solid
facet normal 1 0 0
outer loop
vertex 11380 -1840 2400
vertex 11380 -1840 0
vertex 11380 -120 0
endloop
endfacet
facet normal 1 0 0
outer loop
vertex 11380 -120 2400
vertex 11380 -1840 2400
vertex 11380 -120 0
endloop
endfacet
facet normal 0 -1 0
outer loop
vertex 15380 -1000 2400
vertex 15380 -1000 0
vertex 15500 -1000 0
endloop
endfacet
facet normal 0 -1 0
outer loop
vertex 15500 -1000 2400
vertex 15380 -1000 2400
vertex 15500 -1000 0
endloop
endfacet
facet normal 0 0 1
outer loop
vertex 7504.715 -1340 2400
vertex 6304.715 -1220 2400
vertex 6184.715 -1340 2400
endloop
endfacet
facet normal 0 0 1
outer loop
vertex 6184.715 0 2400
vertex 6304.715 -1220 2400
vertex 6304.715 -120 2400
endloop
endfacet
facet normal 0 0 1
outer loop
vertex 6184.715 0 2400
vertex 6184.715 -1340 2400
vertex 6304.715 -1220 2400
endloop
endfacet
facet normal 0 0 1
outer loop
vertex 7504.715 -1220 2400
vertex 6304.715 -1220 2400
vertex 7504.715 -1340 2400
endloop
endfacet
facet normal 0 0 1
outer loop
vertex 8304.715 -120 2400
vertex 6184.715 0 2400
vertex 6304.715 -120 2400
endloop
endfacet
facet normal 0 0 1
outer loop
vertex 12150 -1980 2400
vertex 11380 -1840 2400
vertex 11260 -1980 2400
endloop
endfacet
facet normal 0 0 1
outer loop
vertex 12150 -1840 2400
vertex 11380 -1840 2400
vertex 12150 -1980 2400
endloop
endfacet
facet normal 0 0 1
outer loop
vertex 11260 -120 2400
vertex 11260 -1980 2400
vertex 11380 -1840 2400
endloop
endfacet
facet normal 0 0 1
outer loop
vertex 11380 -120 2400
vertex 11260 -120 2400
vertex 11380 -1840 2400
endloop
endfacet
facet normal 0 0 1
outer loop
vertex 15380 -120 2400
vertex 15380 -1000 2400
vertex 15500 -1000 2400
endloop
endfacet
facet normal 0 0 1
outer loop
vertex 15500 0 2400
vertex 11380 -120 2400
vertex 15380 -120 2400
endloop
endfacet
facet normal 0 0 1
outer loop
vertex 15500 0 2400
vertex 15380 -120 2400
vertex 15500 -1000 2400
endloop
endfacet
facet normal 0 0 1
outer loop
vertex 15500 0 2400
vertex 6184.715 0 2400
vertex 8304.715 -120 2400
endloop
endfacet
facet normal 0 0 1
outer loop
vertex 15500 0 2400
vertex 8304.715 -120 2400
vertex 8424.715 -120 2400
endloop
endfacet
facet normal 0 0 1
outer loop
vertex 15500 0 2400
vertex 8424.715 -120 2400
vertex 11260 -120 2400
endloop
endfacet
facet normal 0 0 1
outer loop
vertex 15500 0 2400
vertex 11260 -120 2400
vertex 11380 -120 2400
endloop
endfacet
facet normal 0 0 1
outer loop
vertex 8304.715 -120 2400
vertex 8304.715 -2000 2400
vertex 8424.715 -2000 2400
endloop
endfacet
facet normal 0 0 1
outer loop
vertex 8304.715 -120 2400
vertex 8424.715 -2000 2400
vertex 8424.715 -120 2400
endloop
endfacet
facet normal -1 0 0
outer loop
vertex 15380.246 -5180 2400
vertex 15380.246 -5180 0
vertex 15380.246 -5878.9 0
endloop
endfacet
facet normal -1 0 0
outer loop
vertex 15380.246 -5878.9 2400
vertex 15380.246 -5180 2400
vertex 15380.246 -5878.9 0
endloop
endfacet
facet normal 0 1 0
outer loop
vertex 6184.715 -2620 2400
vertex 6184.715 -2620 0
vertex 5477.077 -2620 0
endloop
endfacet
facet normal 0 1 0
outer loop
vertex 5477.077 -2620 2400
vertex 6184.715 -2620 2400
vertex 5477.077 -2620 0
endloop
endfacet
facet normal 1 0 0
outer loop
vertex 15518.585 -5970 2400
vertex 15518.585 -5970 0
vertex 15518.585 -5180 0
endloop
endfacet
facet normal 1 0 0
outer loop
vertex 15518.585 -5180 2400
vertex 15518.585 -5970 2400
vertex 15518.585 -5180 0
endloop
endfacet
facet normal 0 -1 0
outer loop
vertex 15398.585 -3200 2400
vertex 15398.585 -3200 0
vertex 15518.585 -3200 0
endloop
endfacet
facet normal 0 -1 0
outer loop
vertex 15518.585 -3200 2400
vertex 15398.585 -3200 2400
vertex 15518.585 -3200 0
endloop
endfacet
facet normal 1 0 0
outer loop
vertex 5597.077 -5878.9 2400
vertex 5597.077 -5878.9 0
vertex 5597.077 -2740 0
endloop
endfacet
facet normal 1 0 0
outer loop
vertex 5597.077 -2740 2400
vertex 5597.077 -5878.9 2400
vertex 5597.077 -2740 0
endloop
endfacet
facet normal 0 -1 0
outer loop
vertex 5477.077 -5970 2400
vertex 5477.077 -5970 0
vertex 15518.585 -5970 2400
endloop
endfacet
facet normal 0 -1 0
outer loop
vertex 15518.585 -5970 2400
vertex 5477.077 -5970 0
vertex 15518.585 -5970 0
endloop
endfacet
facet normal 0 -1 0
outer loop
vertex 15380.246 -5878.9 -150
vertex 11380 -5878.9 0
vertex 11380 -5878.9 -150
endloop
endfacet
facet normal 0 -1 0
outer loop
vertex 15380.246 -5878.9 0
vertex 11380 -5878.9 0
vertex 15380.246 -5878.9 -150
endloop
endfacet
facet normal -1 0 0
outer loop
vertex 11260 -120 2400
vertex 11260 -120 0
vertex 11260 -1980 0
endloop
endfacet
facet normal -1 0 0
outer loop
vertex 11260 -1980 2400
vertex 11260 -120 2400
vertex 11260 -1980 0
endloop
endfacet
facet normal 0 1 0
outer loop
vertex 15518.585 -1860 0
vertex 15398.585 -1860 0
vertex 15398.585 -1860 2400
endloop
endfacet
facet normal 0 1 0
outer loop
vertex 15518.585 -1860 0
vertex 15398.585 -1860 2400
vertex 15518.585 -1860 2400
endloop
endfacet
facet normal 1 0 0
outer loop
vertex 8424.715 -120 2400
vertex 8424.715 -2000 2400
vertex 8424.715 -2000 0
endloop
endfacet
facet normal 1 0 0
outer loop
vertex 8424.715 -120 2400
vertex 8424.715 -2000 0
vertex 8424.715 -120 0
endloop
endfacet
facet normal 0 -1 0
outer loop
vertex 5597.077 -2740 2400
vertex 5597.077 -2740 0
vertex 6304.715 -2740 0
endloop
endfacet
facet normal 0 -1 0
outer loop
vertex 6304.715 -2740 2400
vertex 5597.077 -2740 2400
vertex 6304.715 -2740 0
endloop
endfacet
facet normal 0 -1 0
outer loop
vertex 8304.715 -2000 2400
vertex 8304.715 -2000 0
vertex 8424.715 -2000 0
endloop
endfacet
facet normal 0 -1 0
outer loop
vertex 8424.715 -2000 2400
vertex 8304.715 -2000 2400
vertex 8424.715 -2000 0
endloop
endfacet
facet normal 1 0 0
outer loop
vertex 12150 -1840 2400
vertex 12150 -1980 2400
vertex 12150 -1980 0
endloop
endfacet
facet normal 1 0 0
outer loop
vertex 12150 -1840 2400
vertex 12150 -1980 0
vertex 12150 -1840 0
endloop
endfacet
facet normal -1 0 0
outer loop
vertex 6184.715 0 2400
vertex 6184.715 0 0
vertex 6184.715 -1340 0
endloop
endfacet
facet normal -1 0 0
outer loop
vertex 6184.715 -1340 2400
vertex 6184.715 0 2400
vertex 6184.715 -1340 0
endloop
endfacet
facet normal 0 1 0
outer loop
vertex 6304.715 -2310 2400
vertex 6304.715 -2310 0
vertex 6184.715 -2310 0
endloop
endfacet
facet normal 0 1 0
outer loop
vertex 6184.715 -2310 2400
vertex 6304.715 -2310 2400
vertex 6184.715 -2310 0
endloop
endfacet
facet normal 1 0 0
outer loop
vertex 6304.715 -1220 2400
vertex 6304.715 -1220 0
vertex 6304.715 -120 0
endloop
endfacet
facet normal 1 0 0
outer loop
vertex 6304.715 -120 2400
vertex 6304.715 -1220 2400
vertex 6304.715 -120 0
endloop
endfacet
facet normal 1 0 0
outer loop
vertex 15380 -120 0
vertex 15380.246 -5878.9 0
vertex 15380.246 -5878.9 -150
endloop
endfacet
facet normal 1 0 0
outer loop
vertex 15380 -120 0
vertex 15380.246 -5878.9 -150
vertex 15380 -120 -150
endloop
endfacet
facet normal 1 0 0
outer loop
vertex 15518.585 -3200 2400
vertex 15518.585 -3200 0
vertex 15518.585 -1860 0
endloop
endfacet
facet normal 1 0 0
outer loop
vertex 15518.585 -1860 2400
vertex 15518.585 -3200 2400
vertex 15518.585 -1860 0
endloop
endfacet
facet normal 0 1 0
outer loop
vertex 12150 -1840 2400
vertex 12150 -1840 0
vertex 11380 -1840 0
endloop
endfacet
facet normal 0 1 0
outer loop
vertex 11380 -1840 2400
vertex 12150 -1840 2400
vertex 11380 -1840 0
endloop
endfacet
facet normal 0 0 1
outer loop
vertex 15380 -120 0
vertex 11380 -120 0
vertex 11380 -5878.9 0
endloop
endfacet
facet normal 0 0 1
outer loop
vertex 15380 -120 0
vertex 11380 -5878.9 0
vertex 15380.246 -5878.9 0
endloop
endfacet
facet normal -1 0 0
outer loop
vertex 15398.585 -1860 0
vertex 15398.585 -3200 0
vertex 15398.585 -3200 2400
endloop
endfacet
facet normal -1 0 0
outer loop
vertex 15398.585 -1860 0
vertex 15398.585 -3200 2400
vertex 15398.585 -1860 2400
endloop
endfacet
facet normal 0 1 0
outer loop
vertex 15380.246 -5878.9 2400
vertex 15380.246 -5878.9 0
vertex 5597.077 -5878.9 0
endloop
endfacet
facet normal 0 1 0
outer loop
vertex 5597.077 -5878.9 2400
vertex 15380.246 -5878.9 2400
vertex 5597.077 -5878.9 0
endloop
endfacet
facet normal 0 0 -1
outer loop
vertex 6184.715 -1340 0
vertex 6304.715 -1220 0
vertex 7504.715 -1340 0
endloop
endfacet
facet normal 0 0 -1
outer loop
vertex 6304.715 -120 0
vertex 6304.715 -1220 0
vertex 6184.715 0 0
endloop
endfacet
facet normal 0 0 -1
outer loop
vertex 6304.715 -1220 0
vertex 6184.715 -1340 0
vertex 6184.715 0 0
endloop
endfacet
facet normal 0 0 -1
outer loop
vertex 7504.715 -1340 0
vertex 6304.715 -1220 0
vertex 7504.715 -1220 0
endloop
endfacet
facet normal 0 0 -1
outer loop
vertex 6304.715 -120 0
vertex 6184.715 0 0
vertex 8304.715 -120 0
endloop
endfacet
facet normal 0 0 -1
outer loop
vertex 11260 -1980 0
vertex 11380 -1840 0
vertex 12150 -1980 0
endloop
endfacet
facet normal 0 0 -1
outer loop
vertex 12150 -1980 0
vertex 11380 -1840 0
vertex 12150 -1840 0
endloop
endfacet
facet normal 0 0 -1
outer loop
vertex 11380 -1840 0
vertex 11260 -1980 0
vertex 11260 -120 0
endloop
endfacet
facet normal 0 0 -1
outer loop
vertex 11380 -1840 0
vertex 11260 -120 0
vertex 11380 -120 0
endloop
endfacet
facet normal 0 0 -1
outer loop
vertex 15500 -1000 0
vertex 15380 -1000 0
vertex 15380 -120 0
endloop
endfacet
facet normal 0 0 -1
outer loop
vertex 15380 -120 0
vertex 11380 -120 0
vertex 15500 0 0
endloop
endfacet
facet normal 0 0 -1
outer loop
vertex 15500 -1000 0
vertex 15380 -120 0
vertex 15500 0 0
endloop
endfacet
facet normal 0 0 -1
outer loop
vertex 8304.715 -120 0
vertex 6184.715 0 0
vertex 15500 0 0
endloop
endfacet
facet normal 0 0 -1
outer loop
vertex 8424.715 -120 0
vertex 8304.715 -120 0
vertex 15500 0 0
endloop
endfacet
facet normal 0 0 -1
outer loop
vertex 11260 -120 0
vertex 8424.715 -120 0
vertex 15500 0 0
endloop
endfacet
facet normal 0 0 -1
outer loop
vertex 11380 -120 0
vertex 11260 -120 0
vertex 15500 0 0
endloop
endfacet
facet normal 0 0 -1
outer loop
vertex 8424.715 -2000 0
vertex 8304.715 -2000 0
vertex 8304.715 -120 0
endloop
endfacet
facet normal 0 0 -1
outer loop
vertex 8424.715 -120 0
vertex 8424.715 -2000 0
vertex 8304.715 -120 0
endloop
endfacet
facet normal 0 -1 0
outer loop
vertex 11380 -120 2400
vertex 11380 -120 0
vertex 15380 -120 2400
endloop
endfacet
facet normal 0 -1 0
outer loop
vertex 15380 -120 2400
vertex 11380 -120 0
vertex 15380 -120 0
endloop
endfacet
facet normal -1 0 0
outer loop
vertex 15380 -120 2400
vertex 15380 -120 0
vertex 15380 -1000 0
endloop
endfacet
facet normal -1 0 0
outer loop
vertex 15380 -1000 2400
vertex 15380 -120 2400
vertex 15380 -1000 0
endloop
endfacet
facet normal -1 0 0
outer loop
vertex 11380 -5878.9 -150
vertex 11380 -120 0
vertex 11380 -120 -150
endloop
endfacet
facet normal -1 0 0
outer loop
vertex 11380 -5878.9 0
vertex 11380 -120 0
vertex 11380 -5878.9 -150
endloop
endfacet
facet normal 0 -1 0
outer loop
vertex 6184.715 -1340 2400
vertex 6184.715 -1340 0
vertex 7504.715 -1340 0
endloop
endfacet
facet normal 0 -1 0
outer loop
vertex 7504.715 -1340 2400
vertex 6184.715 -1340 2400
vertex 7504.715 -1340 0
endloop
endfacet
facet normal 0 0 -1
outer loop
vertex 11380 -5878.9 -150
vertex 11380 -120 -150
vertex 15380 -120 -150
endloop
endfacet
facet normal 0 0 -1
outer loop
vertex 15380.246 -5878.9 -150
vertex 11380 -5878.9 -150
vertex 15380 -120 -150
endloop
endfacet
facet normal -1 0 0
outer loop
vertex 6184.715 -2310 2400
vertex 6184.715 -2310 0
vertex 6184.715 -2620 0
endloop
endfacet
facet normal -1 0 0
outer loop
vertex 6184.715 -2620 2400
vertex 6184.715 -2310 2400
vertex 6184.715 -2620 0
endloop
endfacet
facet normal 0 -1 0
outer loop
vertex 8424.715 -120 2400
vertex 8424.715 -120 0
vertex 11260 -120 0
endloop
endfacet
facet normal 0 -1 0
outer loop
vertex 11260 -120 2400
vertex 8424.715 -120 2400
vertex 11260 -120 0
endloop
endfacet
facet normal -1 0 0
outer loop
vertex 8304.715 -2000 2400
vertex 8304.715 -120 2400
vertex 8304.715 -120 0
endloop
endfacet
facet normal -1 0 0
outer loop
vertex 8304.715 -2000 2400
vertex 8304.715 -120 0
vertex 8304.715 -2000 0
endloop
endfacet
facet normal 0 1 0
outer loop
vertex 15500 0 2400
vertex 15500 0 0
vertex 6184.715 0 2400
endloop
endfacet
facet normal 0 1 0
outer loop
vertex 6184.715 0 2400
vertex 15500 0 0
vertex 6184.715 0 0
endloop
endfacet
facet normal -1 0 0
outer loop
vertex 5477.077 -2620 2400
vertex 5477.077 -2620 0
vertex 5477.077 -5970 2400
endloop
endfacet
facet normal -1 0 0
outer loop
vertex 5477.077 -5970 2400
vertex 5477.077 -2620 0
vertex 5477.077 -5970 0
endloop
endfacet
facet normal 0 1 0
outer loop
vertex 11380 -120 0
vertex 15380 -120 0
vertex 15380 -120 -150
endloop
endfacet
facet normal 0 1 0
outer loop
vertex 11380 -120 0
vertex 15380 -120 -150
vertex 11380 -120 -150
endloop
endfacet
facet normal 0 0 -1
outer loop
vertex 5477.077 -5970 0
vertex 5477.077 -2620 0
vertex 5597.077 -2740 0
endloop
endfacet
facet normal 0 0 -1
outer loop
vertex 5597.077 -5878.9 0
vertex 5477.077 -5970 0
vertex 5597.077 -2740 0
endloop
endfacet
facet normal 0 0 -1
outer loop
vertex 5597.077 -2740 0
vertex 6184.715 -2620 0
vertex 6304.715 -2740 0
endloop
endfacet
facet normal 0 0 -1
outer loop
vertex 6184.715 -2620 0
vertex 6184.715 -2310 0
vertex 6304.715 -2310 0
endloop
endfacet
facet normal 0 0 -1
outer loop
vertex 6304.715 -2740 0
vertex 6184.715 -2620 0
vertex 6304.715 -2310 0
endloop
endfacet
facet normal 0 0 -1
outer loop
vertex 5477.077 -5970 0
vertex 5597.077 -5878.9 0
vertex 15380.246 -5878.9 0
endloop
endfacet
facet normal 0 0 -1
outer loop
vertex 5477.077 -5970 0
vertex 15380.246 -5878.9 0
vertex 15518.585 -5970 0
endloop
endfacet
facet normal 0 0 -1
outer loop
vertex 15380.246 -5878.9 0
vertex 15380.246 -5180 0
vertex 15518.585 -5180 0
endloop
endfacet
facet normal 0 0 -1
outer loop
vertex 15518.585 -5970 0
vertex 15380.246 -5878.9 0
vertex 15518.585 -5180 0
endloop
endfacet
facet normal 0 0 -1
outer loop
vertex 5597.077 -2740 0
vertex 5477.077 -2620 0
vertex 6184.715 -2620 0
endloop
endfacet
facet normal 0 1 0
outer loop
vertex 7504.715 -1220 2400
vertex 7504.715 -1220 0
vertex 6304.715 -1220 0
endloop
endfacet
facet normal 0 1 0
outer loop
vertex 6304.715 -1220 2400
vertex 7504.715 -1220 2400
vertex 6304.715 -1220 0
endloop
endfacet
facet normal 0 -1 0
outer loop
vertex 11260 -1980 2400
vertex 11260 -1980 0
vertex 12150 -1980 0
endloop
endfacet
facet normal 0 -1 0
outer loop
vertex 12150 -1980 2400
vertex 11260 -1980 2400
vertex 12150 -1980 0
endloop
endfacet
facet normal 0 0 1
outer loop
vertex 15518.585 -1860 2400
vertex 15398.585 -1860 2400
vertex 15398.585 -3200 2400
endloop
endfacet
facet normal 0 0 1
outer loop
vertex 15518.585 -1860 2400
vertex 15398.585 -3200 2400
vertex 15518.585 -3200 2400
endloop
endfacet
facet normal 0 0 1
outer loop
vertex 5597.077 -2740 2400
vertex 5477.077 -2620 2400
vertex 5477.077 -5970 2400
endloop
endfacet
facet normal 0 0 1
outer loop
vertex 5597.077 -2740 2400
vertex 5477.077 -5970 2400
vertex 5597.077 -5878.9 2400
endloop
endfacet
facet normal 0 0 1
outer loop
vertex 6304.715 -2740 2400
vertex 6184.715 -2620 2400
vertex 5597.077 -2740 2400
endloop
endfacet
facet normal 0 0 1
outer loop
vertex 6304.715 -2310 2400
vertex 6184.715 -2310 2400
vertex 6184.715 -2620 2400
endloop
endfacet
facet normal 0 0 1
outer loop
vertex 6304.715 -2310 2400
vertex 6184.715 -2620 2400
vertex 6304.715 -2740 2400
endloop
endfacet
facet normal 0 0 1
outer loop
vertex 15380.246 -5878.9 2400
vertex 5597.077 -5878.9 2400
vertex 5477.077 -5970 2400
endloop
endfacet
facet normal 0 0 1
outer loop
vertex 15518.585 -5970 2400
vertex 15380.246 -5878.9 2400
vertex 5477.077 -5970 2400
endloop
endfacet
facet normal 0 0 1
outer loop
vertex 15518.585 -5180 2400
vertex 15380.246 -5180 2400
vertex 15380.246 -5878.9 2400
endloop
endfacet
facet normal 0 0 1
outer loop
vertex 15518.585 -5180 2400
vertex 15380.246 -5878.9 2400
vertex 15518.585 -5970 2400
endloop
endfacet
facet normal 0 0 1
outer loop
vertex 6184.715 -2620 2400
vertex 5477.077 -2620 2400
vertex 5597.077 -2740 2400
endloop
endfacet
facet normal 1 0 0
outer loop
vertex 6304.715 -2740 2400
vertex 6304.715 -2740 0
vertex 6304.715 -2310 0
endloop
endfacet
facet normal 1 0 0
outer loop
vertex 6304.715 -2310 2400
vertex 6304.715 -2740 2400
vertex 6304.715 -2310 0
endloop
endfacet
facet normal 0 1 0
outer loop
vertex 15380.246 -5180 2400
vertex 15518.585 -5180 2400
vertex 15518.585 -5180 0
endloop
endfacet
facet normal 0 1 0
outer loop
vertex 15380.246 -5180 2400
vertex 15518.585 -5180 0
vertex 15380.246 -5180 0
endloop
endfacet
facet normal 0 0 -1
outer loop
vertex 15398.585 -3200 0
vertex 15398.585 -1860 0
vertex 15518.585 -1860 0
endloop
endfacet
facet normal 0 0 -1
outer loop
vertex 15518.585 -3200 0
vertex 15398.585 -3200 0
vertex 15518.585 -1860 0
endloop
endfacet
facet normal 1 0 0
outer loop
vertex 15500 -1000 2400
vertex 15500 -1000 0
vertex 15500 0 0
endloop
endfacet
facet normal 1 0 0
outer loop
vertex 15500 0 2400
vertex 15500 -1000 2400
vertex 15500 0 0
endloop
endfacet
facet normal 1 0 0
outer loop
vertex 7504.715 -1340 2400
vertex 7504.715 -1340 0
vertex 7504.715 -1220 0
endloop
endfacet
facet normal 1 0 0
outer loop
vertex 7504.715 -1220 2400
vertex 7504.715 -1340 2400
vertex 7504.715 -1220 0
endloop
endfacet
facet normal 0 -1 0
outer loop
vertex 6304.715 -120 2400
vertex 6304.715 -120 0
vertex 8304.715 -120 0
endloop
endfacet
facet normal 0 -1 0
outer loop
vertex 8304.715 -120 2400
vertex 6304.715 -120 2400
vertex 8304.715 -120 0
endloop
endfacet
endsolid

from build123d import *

# Parameters (mm, degrees)
F1_W     = 120
F1_H     = 1340
F2_DEPTH = 2400
F4_DEPTH = 150


with BuildPart() as f2:
    # F1 (on Top) → F2 (new body)
    with BuildSketch(Plane.XY):
        Polygon((11380, -1840), (11380, -120), (15380, -120), (15380, -1000), (15500, -1000), (15500, 0), (6184.715195, 0), (6184.715195, -1340), (7504.715195, -1340), (7504.715195, -1220), (6304.715195, -1220), (6304.715195, -120), (8304.715195, -120), (8304.715195, -2000), (8424.715195, -2000), (8424.715195, -120), (11260, -120), (11260, -1980), (12150, -1980), (12150, -1840), align=None)
        with Locations((15458.585205, -2530)):
            Rectangle(F1_W, F1_H)
        Polygon((15518.585205, -5970), (15518.585205, -5180), (15380.246162, -5180), (15380.246162, -5878.899937), (5597.076817, -5878.899937), (5597.076817, -2740), (6304.715195, -2740), (6304.715195, -2310), (6184.715195, -2310), (6184.715195, -2620), (5477.076817, -2620), (5477.076817, -5970), align=None)
    extrude(amount=F2_DEPTH)


with BuildPart() as f4:
    # F3 (on Top) → F4 (new body)
    with BuildSketch(Plane.XY):
        Polygon((15380, -120), (11380, -120), (11380, -5878.899937), (15380.246162, -5878.899937), align=None)
    extrude(amount=-F4_DEPTH)


solid = Compound([f2.part, f4.part])
